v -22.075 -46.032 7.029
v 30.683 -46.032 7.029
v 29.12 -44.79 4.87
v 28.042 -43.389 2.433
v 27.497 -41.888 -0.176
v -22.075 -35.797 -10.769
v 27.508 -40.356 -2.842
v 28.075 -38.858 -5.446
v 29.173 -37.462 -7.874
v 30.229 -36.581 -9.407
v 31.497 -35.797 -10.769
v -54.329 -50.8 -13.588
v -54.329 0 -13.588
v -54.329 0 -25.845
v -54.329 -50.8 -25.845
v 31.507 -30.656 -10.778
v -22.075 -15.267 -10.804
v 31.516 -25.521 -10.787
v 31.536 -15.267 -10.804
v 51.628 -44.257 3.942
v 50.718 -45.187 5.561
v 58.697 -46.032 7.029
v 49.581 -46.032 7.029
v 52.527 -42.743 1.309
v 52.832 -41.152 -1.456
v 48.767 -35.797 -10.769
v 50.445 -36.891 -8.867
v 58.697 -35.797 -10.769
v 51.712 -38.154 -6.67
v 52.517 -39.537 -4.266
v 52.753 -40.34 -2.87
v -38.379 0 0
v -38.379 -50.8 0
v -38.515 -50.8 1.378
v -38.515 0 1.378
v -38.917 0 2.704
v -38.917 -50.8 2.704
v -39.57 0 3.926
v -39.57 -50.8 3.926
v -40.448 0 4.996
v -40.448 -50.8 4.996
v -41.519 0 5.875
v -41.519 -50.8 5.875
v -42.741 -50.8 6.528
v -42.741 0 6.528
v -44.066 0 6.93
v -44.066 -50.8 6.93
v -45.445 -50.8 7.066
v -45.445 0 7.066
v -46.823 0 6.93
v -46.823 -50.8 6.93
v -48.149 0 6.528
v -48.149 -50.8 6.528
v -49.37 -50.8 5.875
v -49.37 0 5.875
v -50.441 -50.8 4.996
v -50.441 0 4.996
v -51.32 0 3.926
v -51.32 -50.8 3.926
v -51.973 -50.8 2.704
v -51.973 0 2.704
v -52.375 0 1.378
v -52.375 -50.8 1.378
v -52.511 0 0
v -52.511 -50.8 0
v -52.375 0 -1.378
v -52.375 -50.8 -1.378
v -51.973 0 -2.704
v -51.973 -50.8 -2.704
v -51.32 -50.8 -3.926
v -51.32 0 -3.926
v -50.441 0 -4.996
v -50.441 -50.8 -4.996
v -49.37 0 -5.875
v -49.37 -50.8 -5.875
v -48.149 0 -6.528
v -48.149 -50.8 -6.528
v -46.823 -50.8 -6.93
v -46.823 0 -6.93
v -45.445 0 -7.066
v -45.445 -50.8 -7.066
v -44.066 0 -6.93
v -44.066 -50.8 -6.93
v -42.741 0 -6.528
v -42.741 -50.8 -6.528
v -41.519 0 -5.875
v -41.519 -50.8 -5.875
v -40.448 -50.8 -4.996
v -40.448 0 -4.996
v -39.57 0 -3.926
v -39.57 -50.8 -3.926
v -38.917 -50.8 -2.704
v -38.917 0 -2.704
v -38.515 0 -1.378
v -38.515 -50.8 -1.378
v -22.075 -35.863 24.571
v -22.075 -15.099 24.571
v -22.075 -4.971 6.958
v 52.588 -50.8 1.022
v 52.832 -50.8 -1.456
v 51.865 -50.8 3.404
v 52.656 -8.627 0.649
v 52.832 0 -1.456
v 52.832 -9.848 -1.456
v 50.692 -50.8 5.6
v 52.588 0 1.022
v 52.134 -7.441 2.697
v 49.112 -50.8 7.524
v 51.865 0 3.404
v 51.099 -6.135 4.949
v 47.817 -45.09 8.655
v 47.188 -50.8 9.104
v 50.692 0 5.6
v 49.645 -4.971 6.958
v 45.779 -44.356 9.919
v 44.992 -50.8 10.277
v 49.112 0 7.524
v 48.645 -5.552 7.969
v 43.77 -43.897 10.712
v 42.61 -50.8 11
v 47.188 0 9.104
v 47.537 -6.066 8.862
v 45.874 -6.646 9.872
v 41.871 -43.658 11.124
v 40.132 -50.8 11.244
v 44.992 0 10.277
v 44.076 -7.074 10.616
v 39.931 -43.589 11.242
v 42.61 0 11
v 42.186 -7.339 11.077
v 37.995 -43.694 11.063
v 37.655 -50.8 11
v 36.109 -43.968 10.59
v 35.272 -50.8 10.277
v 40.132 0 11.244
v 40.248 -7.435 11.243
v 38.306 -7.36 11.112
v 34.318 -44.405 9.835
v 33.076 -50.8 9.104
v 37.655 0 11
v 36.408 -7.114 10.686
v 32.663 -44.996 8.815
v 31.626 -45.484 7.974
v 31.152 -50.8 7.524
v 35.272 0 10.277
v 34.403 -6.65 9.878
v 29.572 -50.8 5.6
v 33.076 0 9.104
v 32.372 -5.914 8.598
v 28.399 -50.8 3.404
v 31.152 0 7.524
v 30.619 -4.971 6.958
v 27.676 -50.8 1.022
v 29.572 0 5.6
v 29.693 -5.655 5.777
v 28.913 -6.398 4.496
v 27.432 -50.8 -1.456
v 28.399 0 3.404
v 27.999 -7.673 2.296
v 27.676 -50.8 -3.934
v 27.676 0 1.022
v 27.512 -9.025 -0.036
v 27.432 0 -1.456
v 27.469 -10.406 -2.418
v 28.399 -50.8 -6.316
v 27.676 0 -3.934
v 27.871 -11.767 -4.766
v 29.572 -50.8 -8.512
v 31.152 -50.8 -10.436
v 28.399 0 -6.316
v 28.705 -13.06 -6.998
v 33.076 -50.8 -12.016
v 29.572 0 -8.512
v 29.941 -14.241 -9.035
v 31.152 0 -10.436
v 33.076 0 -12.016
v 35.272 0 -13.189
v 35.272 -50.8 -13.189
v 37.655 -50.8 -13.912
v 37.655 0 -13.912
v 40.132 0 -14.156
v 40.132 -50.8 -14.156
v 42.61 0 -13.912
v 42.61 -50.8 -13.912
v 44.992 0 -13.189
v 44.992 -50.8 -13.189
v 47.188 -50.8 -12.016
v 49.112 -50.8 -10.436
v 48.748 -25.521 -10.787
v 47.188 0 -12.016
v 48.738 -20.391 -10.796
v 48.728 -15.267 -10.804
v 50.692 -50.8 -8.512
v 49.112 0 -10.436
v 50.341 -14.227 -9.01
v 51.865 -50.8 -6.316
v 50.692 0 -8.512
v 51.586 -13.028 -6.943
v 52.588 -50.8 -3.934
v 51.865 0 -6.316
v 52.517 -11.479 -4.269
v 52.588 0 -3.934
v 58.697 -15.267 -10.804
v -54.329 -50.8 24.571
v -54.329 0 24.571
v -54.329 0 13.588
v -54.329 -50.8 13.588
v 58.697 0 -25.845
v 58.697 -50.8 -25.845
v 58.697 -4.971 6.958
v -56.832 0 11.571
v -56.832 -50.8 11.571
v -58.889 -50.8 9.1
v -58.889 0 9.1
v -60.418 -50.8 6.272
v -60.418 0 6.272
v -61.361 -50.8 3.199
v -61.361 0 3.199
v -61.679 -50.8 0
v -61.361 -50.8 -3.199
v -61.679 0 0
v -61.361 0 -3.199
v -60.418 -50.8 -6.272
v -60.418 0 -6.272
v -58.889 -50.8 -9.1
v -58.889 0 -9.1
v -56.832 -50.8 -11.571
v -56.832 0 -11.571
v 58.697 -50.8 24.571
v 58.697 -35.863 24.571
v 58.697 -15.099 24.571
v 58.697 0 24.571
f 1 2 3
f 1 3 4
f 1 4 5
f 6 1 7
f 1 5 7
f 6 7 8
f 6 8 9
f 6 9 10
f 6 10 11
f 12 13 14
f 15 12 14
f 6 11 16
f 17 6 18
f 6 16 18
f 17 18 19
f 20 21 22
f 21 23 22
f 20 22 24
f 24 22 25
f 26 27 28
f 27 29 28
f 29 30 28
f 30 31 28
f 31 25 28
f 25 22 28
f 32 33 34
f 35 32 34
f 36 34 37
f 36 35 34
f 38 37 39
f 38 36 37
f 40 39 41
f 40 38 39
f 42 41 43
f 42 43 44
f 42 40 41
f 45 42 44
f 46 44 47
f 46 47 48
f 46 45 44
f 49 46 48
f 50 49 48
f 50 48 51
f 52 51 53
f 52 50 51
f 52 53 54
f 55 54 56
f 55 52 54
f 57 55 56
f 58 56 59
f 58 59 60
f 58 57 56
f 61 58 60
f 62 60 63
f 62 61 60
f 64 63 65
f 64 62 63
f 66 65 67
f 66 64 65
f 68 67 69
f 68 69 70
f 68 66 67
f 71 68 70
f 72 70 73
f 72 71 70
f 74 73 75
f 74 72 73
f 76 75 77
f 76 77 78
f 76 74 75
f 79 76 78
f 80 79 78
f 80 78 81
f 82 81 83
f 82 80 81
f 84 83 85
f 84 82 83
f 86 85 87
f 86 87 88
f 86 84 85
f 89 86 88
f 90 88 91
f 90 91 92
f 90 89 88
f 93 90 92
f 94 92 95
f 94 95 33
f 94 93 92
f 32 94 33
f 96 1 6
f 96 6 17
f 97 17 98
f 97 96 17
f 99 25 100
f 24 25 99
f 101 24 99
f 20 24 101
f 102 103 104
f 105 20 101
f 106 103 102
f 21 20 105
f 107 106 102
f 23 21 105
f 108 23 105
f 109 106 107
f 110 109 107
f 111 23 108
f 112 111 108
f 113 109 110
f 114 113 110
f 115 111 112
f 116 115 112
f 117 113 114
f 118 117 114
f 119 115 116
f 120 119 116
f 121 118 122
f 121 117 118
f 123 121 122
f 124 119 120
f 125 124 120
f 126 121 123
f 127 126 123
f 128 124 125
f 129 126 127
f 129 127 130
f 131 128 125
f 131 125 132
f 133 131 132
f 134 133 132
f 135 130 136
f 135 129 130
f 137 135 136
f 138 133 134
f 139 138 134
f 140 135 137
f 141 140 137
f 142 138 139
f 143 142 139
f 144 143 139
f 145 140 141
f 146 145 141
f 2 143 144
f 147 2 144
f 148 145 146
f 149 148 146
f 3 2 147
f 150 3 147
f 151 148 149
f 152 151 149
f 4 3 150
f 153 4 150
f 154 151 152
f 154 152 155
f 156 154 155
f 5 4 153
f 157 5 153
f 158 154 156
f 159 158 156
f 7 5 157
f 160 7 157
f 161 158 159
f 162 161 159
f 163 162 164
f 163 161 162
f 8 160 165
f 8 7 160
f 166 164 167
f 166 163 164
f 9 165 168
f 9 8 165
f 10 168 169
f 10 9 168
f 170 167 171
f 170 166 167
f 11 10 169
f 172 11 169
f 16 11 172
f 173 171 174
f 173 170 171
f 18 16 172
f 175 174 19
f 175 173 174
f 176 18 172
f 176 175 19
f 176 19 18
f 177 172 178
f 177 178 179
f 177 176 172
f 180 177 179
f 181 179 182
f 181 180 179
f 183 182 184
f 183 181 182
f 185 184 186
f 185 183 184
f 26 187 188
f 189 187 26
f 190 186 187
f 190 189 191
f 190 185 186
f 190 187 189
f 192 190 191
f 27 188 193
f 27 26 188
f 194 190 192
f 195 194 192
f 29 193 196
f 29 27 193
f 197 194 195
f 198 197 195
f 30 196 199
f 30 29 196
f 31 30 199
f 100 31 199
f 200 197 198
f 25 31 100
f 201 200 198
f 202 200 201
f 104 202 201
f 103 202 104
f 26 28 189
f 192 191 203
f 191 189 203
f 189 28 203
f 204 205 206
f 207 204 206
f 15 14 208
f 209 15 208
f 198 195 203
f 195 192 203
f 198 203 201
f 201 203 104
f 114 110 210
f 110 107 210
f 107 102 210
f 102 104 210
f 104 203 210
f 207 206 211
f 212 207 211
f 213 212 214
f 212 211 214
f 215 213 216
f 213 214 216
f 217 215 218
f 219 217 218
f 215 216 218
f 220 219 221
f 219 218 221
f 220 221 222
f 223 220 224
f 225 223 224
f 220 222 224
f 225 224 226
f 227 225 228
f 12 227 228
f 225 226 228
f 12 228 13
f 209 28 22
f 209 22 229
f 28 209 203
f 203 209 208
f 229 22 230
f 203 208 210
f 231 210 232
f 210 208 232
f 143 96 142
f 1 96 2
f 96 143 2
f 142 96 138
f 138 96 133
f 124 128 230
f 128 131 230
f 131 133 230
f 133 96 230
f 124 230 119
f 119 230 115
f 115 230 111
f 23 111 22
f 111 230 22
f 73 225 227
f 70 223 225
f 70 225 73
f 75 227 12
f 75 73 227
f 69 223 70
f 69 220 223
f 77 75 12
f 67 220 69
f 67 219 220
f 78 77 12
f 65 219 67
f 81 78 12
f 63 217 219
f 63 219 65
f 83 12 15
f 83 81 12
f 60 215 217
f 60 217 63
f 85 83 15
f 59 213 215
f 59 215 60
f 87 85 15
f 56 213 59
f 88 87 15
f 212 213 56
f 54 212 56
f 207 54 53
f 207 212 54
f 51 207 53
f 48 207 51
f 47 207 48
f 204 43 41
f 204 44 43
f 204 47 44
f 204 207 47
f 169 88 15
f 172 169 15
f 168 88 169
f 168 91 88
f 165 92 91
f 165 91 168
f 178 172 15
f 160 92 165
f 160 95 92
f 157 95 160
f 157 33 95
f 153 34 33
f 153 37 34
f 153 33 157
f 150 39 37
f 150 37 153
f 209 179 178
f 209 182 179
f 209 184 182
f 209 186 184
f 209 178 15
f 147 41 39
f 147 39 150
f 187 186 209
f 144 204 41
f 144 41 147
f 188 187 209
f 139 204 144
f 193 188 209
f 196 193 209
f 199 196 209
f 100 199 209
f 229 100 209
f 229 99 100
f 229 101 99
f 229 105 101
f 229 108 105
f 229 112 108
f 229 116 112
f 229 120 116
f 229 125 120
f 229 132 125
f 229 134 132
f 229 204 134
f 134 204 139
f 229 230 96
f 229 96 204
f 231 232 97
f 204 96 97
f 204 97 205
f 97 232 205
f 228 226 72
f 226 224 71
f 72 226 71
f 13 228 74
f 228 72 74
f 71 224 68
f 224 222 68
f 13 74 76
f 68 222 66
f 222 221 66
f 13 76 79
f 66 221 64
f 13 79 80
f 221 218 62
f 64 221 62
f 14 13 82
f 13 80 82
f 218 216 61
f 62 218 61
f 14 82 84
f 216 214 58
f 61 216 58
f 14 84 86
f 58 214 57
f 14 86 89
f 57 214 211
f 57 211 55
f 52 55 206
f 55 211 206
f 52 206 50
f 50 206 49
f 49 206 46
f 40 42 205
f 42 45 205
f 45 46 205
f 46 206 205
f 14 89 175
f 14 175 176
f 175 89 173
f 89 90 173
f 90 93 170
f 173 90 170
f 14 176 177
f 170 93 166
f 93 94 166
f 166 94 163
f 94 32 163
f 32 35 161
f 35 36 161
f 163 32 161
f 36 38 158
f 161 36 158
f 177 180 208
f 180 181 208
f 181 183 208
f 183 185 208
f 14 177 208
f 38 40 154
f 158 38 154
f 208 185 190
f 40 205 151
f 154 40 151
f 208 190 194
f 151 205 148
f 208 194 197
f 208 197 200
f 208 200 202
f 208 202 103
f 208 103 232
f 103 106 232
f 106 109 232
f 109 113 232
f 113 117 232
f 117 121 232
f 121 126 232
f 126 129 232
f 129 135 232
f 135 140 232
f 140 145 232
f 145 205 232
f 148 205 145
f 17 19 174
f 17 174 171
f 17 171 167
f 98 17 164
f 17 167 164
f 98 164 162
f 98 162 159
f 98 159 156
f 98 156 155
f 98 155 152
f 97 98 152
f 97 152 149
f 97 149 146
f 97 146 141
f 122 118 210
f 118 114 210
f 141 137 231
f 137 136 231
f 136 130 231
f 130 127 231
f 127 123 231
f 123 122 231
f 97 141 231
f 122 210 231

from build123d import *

# Parameters (mm, degrees)
F0_R     = 12.7
F0_R_2   = 7.065837
F1_DEPTH = 50.8
F3_DEPTH = 80.772


with BuildPart() as f1:
    # F0 (on Front) → F1 (new body)
    with BuildSketch(Plane.XZ):
        Polygon((58.696682, 24.570704), (-54.328558, 24.570704), (-54.328558, 13.587744), (-54.328558, -13.587744), (-54.328558, -25.844741), (58.696682, -25.844741), align=None)
        with Locations((40.132153, -1.456042)):
            Circle(F0_R, mode=Mode.SUBTRACT)
        with Locations((-45.444705, 0)):
            Circle(F0_R_2, mode=Mode.SUBTRACT)
        with BuildLine():
            Line((-54.328558, -13.587744), (-54.328558, 13.587744))
            ThreePointArc((-54.328558, 13.587744), (-61.678917, 0), (-54.328558, -13.587744))
        make_face()
    extrude(amount=F1_DEPTH)

    # F2 (on face) → F3 (cut)
    with BuildSketch(Plane.YZ.offset(58.696682)):
        Polygon((-46.031717, 7.029241), (-35.797476, -10.768648), (-15.266932, -10.80448), (-4.970628, 6.957576), (-15.098626, 24.570704), (-35.863286, 24.570704), align=None)
    extrude(amount=-F3_DEPTH, mode=Mode.SUBTRACT)


solid = f1.part
